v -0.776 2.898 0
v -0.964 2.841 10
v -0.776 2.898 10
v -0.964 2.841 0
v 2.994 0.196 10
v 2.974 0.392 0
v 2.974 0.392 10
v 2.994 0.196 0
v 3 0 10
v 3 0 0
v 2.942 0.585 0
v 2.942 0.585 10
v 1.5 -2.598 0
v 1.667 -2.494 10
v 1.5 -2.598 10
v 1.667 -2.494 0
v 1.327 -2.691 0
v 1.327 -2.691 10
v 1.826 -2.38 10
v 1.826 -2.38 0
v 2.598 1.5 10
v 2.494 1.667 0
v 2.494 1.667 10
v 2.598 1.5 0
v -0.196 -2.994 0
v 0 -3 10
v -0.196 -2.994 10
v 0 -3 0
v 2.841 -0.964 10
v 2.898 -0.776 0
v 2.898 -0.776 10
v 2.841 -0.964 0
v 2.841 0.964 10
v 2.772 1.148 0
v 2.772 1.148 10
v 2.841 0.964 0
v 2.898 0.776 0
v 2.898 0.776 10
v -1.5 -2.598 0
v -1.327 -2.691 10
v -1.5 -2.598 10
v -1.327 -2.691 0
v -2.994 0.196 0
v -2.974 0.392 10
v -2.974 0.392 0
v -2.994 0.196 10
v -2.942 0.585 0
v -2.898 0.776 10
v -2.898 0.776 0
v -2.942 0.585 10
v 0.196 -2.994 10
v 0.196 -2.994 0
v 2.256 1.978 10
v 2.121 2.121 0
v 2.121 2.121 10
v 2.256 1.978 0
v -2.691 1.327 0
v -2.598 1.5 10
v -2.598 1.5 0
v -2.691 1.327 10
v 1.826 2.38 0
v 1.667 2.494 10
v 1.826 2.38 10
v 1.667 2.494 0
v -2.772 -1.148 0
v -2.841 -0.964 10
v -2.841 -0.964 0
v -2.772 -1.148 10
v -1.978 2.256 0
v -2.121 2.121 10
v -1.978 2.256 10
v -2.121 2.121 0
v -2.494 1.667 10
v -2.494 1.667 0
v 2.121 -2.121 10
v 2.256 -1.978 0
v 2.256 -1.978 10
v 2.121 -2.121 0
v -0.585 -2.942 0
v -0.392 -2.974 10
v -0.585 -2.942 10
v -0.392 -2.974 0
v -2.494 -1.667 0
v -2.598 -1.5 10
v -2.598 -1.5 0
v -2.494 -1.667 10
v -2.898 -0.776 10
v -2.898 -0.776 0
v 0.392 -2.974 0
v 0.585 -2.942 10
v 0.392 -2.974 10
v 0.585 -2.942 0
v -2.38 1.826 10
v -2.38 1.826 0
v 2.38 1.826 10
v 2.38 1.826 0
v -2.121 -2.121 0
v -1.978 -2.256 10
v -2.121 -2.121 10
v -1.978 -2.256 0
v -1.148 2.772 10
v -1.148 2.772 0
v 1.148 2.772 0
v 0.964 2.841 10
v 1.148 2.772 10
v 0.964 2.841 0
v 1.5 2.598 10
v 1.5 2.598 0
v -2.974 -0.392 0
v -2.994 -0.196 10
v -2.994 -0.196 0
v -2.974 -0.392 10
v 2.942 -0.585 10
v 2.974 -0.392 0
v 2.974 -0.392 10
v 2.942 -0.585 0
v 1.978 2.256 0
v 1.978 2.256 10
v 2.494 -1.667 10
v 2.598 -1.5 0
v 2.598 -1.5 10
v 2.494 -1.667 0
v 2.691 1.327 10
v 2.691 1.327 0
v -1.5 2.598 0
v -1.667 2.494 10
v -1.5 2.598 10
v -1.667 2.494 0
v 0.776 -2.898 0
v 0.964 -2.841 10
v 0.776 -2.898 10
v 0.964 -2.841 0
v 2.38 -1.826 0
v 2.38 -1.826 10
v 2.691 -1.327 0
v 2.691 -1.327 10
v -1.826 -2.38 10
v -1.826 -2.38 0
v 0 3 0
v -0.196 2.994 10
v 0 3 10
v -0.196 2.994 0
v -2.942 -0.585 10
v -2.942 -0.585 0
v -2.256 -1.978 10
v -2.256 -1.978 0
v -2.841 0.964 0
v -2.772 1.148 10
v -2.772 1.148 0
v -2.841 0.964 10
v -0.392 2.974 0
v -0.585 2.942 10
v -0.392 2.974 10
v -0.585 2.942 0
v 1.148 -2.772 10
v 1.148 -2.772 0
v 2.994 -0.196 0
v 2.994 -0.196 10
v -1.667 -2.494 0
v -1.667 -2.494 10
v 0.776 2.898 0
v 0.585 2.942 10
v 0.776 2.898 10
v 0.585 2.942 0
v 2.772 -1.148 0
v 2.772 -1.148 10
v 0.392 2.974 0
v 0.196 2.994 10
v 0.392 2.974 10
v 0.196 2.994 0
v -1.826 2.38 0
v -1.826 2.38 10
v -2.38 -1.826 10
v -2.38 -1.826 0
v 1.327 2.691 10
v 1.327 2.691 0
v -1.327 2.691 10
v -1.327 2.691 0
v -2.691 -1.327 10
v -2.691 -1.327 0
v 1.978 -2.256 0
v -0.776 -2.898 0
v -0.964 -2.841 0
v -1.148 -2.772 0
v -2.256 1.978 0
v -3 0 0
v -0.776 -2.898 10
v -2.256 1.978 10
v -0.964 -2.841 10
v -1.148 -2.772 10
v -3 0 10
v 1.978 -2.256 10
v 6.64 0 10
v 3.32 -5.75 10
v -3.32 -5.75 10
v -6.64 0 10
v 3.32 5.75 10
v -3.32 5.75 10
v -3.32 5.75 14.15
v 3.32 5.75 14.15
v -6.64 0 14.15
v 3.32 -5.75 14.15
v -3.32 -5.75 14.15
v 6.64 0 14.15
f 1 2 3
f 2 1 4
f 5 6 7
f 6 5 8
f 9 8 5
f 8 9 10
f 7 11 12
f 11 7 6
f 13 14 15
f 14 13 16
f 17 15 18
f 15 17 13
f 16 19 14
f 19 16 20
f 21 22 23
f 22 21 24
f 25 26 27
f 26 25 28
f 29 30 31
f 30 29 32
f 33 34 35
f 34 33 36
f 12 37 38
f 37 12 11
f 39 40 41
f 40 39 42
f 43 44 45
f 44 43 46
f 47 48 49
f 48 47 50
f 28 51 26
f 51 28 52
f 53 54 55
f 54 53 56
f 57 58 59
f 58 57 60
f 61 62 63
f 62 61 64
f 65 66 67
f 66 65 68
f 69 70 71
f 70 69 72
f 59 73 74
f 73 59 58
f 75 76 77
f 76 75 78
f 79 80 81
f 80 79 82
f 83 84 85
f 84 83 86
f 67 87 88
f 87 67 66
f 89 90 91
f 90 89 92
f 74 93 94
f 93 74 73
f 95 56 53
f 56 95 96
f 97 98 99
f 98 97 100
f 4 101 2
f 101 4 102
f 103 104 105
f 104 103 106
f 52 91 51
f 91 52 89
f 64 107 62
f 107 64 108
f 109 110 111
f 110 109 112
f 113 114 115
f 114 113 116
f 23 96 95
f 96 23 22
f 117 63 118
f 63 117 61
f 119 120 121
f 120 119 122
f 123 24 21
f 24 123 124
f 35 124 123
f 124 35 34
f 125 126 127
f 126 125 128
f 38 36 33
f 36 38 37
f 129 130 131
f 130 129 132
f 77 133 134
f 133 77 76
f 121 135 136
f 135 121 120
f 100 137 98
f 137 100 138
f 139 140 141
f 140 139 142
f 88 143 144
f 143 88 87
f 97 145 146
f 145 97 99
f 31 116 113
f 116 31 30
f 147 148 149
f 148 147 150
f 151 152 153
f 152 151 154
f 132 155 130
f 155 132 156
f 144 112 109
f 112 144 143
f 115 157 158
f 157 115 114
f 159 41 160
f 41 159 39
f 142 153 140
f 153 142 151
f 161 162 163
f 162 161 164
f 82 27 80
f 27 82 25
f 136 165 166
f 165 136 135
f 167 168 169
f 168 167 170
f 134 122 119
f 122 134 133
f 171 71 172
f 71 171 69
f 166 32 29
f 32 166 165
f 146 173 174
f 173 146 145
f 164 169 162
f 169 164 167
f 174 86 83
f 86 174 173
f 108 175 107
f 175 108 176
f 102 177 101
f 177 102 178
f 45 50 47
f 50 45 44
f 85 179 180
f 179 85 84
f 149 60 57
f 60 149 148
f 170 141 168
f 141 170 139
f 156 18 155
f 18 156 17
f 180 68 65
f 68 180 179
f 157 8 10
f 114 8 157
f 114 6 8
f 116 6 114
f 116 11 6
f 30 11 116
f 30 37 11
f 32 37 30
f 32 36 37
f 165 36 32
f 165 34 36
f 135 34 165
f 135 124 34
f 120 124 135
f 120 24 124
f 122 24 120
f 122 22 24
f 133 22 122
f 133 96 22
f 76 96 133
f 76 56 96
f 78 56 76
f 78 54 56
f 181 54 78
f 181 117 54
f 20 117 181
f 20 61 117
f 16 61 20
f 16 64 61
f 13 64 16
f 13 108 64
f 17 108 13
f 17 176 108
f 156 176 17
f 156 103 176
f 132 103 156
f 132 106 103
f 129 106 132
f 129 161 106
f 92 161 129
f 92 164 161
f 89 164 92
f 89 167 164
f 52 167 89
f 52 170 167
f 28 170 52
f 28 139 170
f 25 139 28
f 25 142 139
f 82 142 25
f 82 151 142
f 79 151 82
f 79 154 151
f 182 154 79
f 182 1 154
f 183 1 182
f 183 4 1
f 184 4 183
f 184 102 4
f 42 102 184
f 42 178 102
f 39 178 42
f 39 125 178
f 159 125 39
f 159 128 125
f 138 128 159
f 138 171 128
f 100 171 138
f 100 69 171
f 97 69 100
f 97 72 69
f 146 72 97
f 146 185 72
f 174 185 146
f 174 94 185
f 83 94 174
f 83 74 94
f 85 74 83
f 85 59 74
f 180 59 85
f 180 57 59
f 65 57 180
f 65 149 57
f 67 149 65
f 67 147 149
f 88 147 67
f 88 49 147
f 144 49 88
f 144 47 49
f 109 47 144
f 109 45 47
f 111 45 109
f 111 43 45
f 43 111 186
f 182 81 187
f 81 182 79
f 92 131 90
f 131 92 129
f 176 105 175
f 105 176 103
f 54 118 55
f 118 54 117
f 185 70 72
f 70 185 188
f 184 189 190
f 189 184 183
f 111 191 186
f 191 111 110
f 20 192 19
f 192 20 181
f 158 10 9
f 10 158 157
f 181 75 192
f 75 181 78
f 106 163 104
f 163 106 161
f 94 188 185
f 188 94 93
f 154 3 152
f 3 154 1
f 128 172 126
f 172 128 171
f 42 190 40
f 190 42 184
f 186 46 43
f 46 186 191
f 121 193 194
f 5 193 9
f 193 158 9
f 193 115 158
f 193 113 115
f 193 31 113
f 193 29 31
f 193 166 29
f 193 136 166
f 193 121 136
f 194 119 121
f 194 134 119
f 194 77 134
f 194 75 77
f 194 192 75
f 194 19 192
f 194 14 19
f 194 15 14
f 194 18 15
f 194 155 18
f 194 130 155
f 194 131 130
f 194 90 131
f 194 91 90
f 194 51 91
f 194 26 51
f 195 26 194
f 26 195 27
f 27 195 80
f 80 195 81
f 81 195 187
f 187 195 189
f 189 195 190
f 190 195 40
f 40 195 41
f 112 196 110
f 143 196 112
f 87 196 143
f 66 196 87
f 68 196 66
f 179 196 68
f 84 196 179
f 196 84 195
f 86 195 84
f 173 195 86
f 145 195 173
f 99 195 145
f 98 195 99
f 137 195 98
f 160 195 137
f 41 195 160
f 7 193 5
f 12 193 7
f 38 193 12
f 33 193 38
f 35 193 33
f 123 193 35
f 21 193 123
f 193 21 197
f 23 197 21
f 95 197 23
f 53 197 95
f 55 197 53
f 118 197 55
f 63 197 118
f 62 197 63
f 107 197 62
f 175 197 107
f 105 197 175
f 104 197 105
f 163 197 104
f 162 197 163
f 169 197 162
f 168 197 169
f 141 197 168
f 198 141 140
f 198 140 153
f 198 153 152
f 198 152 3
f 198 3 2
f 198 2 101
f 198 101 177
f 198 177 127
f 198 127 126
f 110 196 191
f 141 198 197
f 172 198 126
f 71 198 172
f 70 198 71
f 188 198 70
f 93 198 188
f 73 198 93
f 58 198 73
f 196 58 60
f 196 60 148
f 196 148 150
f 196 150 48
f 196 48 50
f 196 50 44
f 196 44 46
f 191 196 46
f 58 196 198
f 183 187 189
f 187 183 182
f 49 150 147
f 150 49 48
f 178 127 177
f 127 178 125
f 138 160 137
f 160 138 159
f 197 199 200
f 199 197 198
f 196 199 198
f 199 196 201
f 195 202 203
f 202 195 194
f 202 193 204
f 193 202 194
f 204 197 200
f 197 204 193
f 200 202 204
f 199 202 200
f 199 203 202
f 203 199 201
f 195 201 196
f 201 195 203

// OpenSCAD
$fn = 96;

shaft_d = 6.0;
length = 10.0;

head_flat_d = 11.5;   // across flats
head_h = 4.15;

module hex_prism(af, h) {
    // Regular hexagon: across-flats = 2*apothem => circumradius = af / sqrt(3)
    r = af / sqrt(3);
    linear_extrude(height = h)
        polygon(points = [for (i = [0:5]) [r*cos(60*i), r*sin(60*i)]]);
}

union() {
    // Shaft
    cylinder(d = shaft_d, h = length);

    // Hex head on top
    translate([0,0,length])
        hex_prism(head_flat_d, head_h);
}
